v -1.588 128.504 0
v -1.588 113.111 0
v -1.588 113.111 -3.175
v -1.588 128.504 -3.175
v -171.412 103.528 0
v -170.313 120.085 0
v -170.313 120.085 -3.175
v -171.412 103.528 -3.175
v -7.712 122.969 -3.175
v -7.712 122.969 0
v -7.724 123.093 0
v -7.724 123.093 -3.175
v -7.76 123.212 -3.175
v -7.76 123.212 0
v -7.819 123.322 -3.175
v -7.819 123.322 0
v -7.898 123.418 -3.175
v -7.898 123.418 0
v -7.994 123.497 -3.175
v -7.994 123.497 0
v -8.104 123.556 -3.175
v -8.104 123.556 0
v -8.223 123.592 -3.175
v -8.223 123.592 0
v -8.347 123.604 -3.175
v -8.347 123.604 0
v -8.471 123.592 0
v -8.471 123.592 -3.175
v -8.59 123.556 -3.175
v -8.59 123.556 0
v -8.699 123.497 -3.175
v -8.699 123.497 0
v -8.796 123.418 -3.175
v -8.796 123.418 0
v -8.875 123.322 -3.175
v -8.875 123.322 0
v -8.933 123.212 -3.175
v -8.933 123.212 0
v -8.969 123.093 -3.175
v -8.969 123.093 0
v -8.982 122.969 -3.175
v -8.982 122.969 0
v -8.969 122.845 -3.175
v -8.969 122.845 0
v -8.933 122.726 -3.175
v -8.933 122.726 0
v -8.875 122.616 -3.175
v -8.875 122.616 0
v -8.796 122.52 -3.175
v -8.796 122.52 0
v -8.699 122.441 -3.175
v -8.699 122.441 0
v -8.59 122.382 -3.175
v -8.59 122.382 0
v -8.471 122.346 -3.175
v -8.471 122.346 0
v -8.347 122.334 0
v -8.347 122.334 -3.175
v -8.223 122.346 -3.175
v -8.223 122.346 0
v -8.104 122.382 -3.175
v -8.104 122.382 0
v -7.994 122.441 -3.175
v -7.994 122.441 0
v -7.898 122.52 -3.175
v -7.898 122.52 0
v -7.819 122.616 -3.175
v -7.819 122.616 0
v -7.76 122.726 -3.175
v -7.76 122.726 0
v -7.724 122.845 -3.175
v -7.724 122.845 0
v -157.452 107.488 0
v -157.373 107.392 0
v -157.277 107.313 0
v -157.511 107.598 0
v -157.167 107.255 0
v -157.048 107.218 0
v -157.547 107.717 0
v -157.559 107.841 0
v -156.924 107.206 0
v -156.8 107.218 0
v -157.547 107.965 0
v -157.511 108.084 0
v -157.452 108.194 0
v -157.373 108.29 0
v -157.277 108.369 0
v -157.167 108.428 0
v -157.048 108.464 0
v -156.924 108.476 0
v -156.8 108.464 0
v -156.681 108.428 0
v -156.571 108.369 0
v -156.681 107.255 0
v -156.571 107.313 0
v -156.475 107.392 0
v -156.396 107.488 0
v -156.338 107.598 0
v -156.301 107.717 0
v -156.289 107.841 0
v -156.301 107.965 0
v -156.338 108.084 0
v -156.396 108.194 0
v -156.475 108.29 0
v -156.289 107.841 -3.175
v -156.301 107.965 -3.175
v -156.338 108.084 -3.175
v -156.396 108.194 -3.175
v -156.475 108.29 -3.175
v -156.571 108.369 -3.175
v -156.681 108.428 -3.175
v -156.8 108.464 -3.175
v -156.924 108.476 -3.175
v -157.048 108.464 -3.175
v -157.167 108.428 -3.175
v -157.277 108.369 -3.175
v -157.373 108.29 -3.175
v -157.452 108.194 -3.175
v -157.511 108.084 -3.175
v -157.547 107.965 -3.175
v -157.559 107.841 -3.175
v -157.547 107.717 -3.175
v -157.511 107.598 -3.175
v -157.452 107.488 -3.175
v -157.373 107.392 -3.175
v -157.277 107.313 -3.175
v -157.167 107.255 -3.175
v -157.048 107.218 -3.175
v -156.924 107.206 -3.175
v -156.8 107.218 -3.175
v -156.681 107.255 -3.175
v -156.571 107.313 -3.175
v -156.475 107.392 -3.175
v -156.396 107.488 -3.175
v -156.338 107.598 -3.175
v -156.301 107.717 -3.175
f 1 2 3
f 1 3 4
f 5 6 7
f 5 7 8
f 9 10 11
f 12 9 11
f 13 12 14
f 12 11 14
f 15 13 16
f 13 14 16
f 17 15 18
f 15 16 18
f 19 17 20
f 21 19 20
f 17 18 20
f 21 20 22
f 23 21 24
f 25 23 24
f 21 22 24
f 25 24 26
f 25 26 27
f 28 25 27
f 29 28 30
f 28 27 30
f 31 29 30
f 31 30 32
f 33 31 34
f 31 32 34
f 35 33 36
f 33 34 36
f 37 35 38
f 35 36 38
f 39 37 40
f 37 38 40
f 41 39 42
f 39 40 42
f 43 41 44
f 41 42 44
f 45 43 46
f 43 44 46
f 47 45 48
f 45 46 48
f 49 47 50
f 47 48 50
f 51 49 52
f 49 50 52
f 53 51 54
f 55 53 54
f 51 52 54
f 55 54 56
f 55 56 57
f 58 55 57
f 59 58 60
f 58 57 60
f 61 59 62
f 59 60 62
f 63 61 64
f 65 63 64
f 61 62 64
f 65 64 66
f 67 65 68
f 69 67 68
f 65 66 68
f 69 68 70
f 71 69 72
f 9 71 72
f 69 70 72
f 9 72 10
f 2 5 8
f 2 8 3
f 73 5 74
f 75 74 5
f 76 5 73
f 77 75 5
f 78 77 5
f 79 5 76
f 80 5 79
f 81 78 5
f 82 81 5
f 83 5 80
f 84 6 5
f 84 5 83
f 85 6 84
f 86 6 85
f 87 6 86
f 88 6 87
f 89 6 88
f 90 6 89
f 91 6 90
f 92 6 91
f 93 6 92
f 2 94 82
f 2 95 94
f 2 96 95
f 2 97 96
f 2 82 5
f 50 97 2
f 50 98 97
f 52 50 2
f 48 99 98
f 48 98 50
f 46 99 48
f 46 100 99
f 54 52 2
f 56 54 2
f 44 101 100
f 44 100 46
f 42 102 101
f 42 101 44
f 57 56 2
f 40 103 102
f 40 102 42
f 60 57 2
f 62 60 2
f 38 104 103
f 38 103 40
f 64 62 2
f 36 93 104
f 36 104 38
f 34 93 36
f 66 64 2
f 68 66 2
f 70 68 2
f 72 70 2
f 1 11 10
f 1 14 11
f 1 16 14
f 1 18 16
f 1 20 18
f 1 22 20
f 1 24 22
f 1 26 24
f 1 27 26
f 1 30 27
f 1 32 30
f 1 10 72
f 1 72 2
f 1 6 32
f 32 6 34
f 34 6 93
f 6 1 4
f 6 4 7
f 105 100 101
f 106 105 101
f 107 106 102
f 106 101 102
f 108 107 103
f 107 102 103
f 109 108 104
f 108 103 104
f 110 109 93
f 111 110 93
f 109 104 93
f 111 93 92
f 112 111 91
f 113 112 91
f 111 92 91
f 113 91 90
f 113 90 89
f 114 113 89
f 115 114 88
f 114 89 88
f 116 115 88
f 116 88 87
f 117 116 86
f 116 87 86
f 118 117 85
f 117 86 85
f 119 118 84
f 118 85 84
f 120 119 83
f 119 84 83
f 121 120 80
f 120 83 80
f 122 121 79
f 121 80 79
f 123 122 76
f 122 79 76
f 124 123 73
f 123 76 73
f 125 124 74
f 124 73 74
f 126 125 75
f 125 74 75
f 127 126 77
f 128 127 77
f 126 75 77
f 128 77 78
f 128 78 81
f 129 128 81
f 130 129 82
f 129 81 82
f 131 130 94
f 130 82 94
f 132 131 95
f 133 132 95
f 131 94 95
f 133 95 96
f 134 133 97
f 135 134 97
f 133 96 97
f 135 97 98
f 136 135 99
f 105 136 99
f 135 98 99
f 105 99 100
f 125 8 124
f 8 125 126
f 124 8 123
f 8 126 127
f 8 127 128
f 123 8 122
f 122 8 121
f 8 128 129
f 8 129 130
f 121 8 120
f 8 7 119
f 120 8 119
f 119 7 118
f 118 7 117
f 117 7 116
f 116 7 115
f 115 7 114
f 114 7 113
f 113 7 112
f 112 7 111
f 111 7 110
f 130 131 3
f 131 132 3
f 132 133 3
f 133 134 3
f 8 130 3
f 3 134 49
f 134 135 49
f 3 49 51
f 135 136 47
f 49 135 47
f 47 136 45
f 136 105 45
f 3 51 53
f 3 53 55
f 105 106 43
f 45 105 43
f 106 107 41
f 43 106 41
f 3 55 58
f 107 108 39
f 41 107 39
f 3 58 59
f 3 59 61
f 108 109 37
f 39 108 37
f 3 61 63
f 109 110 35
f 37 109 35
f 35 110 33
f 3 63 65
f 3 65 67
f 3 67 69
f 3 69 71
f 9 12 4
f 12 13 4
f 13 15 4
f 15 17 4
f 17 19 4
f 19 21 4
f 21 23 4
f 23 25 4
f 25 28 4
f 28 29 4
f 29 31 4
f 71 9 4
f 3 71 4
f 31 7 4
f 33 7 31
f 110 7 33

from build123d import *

# Parameters (mm, degrees)
SKETCH1_R           = 0.635
BOSS_EXTRUDE1_DEPTH = 3.175


with BuildPart() as part:
    # Sketch1 → Boss-Extrude1 (new body)
    with BuildSketch(Plane.XY):
        Polygon((-1.5875, 113.111399164), (-1.5875, 128.504233601), (-170.312713847, 120.085477895), (-171.411810426, 103.527545161), align=None)
        with Locations((-156.924194119, 107.841267283)):
            Circle(SKETCH1_R, mode=Mode.SUBTRACT)
        with Locations((-8.346623216, 122.968890993)):
            Circle(SKETCH1_R, mode=Mode.SUBTRACT)
    extrude(amount=-BOSS_EXTRUDE1_DEPTH)


solid = part.part
